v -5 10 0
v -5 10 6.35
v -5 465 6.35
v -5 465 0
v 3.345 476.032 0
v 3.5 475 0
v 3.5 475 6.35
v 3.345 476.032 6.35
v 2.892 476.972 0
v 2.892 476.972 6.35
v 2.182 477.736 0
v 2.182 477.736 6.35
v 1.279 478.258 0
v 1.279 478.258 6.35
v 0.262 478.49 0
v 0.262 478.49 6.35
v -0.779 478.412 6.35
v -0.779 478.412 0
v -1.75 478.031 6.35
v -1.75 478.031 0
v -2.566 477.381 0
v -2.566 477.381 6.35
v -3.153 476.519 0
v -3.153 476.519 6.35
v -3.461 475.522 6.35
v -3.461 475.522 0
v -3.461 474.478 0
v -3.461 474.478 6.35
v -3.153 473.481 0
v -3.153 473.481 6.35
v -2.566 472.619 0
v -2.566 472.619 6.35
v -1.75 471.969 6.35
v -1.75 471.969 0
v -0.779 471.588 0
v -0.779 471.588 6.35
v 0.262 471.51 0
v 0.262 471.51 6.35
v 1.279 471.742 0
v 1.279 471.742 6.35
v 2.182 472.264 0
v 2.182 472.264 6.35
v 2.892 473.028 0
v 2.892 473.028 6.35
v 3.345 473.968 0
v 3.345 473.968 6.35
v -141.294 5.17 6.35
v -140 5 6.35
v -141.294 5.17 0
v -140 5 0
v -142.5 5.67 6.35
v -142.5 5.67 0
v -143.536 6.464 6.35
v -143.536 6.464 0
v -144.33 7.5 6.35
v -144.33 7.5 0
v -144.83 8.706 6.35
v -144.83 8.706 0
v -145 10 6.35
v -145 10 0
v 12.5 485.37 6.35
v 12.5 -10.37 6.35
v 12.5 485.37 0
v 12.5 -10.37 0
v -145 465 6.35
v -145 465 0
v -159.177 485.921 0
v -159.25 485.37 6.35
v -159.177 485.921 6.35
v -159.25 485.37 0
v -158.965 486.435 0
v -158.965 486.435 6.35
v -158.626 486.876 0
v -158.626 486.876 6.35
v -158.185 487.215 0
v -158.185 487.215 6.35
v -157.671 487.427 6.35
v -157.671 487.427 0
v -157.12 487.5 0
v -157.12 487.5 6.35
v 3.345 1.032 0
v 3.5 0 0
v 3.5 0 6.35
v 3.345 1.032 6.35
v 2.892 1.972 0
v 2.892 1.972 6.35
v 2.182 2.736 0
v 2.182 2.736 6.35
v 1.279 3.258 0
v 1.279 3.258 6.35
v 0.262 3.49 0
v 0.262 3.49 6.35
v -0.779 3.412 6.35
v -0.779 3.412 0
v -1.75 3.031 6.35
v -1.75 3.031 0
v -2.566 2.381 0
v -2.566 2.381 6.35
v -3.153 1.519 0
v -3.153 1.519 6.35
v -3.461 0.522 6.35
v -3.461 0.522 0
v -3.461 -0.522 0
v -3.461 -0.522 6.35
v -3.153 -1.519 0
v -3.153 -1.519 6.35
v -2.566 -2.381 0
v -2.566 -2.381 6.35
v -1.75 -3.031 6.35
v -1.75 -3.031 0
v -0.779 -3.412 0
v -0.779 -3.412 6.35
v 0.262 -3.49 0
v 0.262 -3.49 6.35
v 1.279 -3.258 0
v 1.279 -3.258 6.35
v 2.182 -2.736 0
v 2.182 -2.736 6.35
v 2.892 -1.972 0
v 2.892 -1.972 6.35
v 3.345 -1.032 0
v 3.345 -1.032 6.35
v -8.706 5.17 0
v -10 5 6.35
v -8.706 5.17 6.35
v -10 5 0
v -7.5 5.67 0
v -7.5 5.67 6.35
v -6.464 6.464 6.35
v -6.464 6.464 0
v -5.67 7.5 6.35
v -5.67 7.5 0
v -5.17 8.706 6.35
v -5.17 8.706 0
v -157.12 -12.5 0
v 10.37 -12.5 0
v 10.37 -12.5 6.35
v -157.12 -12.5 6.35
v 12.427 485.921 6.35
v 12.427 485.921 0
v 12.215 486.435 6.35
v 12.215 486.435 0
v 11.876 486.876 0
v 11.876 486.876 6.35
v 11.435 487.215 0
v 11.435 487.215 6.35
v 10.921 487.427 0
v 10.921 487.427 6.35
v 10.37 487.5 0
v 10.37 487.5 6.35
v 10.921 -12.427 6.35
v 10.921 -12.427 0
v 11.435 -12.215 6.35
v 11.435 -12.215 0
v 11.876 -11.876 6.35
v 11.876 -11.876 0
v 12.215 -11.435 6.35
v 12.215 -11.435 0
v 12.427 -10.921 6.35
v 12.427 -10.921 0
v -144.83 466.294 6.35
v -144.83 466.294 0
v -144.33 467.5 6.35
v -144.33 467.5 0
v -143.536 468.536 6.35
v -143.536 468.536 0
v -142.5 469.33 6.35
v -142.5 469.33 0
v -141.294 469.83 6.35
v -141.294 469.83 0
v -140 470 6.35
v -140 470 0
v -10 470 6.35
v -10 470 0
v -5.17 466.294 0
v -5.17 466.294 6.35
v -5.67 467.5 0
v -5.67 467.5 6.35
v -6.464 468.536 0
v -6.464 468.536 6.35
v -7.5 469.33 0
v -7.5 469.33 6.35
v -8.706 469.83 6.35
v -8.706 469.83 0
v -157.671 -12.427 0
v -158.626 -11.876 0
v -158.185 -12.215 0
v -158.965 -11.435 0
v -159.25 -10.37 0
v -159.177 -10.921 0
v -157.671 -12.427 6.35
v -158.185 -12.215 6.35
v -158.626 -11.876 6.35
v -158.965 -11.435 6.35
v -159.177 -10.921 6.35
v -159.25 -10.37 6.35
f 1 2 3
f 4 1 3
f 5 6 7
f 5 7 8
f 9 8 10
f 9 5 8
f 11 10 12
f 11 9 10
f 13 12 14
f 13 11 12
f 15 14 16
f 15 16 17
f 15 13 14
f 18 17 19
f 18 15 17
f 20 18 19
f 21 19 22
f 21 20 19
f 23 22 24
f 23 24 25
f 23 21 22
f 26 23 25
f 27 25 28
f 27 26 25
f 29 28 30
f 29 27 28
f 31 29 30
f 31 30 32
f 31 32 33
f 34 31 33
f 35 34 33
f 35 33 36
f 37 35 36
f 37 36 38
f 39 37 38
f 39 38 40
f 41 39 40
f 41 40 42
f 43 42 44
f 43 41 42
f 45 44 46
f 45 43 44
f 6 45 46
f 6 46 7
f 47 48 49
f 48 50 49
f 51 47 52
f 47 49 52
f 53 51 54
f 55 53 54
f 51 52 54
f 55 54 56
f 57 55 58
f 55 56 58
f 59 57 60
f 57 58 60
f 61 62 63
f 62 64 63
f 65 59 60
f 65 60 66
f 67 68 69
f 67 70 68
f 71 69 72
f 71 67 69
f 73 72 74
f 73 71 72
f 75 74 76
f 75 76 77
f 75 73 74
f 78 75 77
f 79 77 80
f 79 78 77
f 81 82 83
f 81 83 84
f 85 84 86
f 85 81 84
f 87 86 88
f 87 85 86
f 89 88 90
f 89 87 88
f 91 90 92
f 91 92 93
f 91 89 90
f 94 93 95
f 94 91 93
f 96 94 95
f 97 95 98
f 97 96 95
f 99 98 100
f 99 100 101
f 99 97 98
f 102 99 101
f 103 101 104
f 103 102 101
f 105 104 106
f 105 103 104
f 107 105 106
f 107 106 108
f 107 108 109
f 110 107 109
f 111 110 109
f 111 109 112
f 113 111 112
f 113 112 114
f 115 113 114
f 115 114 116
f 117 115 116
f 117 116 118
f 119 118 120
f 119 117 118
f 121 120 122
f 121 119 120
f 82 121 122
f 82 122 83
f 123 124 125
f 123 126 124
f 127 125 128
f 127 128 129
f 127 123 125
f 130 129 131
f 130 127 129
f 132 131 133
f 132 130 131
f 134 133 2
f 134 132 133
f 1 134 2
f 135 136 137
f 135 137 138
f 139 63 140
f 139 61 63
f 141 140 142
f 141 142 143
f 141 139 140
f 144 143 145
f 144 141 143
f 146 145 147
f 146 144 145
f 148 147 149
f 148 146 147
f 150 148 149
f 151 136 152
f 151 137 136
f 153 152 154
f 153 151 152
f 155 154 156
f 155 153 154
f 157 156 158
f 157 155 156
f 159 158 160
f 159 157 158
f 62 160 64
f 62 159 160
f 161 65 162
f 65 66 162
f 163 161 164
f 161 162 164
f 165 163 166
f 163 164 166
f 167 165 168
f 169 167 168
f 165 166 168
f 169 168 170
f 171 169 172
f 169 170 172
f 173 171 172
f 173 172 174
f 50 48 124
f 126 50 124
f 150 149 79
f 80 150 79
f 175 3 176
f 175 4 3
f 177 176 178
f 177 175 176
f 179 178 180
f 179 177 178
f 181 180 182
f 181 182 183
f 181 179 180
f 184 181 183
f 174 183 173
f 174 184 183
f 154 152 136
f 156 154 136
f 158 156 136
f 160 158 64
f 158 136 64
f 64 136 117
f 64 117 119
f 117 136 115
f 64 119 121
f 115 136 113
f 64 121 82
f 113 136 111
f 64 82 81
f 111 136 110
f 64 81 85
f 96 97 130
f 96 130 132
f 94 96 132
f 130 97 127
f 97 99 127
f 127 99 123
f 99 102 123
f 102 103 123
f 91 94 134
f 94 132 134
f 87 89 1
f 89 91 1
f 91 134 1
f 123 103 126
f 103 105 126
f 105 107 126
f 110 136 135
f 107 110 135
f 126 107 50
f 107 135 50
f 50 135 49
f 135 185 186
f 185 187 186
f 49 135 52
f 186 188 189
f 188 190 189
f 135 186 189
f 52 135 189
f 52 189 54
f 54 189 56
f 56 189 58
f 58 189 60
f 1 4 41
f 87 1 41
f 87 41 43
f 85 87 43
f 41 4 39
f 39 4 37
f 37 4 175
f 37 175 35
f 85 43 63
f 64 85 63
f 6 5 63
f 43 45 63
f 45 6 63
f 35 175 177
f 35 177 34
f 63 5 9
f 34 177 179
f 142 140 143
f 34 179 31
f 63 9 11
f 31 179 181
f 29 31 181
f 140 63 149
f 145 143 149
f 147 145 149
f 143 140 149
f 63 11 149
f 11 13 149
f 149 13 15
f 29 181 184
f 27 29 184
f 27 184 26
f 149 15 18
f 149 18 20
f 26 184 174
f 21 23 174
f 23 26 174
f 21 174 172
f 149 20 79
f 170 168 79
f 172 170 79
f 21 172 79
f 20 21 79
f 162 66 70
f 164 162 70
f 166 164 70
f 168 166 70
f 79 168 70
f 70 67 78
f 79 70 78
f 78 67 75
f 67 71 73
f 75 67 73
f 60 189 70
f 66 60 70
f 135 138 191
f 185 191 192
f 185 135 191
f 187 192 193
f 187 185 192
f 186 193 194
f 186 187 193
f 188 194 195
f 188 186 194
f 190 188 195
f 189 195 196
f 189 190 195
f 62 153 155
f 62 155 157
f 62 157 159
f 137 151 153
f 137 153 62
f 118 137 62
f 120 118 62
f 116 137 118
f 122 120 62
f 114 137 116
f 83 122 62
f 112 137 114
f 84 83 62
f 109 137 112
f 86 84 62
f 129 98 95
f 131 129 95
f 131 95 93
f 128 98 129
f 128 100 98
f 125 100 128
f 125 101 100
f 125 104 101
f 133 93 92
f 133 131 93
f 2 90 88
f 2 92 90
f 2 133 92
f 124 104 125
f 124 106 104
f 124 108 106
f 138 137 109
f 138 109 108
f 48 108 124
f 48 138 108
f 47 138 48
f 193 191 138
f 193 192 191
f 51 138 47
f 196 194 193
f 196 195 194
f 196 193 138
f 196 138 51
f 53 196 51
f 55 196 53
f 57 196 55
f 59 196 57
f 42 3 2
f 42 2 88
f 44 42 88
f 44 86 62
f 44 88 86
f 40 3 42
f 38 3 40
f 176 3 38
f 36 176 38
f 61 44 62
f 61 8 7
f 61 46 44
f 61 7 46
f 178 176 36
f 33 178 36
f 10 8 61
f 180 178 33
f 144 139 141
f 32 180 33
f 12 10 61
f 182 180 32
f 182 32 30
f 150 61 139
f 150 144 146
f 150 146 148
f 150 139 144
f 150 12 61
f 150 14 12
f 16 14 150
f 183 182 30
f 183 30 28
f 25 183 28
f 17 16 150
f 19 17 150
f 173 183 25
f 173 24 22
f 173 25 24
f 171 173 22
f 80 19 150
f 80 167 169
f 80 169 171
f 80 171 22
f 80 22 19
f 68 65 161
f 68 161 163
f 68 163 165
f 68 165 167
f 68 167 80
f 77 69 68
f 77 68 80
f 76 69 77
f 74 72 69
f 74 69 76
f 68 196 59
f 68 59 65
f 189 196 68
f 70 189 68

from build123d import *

# Parameters (mm, degrees)
SKETCH1_W           = 25
SKETCH1_H           = 125
SKETCH1_W_2         = 450
SKETCH1_H_2         = 25
SKETCH1_R           = 3.5
BOSS_EXTRUDE1_DEPTH = 6.35
SKETCH2_W           = 140.00000048
SKETCH2_H           = 465.00000048
CUT_EXTRUDE1_DEPTH  = 514.909352415
SKETCH3_W           = 3.25
SKETCH3_H           = 500
CUT_EXTRUDE2_DEPTH  = 514.909352415
FILLET1_R           = 2.13
FILLET2_R           = 5


with BuildPart() as part:
    # Sketch1 → Boss-Extrude1 (new body)
    # profile 1 of 6: a face of its own
    with BuildSketch(Plane(origin=(0, 0, 0), x_dir=(0, 1, 0), z_dir=(0, 0, 1))):
        Polygon((-12.5, 137.5), (12.5, 137.5), (462.5, 137.5), (487.5, 137.5), (487.5, 162.5), (-12.5, 162.5), align=None)
    # profile 2 of 6: a face of its own
    with BuildSketch(Plane(origin=(0, 0, 0), x_dir=(0, 1, 0), z_dir=(0, 0, 1))):
        with Locations((0, 75)):
            Rectangle(SKETCH1_W, SKETCH1_H)
    # profile 3 of 6: a face of its own
    with BuildSketch(Plane(origin=(0, 0, 0), x_dir=(0, 1, 0), z_dir=(0, 0, 1))):
        with Locations((237.5, 0)):
            Rectangle(SKETCH1_W_2, SKETCH1_H_2)
    # profile 4 of 6: a face of its own
    with BuildSketch(Plane(origin=(0, 0, 0), x_dir=(0, 1, 0), z_dir=(0, 0, 1))):
        with Locations((475, 75)):
            Rectangle(SKETCH1_W, SKETCH1_H)
    # profile 5 of 6: a face of its own
    with BuildSketch(Plane(origin=(0, 0, 0), x_dir=(0, 1, 0), z_dir=(0, 0, 1))):
        with Locations((475, 0)):
            Rectangle(SKETCH1_W, SKETCH1_H_2)
        with Locations(Location((475, 0, 0), (0, 0, 270))):
            Circle(SKETCH1_R, mode=Mode.SUBTRACT)
    # profile 6 of 6: a face of its own
    with BuildSketch(Plane(origin=(0, 0, 0), x_dir=(0, 1, 0), z_dir=(0, 0, 1))):
        Rectangle(SKETCH1_W, SKETCH1_H_2)
        with Locations(Location((0, 0, 0), (0, 0, 270))):
            Circle(SKETCH1_R, mode=Mode.SUBTRACT)
    extrude(amount=BOSS_EXTRUDE1_DEPTH)

    # Sketch2 → Cut-Extrude1 (cut, through all)
    with BuildSketch(Plane.XY.offset(6.35)):
        with Locations((-75, 237.5)):
            Rectangle(SKETCH2_W, SKETCH2_H)
    extrude(amount=-CUT_EXTRUDE1_DEPTH, mode=Mode.SUBTRACT)

    # Sketch3 → Cut-Extrude2 (cut, through all)
    with BuildSketch(Plane.XY.offset(6.35)):
        with Locations((-160.875, 237.5)):
            Rectangle(SKETCH3_W, SKETCH3_H)
    extrude(amount=-CUT_EXTRUDE2_DEPTH, mode=Mode.SUBTRACT)

    # Fillet1
    fillet1_edges = [part.edges().sort_by_distance(p)[0] for p in [
        (12.5, 487.5, 3.175),
        (12.5, -12.5, 3.175),
        (-159.25, 487.5, 3.175),
        (-159.25, -12.5, 3.175),
    ]]
    fillet(fillet1_edges, radius=FILLET1_R)

    # Fillet2
    fillet2_edges = [part.edges().sort_by_distance(p)[0] for p in [
        (-4.99999976, 470.00000024, 3.175),
        (-4.99999976, 4.99999976, 3.175),
        (-145.00000024, 4.99999976, 3.175),
        (-145.00000024, 470.00000024, 3.175),
    ]]
    fillet(fillet2_edges, radius=FILLET2_R)


solid = part.part
